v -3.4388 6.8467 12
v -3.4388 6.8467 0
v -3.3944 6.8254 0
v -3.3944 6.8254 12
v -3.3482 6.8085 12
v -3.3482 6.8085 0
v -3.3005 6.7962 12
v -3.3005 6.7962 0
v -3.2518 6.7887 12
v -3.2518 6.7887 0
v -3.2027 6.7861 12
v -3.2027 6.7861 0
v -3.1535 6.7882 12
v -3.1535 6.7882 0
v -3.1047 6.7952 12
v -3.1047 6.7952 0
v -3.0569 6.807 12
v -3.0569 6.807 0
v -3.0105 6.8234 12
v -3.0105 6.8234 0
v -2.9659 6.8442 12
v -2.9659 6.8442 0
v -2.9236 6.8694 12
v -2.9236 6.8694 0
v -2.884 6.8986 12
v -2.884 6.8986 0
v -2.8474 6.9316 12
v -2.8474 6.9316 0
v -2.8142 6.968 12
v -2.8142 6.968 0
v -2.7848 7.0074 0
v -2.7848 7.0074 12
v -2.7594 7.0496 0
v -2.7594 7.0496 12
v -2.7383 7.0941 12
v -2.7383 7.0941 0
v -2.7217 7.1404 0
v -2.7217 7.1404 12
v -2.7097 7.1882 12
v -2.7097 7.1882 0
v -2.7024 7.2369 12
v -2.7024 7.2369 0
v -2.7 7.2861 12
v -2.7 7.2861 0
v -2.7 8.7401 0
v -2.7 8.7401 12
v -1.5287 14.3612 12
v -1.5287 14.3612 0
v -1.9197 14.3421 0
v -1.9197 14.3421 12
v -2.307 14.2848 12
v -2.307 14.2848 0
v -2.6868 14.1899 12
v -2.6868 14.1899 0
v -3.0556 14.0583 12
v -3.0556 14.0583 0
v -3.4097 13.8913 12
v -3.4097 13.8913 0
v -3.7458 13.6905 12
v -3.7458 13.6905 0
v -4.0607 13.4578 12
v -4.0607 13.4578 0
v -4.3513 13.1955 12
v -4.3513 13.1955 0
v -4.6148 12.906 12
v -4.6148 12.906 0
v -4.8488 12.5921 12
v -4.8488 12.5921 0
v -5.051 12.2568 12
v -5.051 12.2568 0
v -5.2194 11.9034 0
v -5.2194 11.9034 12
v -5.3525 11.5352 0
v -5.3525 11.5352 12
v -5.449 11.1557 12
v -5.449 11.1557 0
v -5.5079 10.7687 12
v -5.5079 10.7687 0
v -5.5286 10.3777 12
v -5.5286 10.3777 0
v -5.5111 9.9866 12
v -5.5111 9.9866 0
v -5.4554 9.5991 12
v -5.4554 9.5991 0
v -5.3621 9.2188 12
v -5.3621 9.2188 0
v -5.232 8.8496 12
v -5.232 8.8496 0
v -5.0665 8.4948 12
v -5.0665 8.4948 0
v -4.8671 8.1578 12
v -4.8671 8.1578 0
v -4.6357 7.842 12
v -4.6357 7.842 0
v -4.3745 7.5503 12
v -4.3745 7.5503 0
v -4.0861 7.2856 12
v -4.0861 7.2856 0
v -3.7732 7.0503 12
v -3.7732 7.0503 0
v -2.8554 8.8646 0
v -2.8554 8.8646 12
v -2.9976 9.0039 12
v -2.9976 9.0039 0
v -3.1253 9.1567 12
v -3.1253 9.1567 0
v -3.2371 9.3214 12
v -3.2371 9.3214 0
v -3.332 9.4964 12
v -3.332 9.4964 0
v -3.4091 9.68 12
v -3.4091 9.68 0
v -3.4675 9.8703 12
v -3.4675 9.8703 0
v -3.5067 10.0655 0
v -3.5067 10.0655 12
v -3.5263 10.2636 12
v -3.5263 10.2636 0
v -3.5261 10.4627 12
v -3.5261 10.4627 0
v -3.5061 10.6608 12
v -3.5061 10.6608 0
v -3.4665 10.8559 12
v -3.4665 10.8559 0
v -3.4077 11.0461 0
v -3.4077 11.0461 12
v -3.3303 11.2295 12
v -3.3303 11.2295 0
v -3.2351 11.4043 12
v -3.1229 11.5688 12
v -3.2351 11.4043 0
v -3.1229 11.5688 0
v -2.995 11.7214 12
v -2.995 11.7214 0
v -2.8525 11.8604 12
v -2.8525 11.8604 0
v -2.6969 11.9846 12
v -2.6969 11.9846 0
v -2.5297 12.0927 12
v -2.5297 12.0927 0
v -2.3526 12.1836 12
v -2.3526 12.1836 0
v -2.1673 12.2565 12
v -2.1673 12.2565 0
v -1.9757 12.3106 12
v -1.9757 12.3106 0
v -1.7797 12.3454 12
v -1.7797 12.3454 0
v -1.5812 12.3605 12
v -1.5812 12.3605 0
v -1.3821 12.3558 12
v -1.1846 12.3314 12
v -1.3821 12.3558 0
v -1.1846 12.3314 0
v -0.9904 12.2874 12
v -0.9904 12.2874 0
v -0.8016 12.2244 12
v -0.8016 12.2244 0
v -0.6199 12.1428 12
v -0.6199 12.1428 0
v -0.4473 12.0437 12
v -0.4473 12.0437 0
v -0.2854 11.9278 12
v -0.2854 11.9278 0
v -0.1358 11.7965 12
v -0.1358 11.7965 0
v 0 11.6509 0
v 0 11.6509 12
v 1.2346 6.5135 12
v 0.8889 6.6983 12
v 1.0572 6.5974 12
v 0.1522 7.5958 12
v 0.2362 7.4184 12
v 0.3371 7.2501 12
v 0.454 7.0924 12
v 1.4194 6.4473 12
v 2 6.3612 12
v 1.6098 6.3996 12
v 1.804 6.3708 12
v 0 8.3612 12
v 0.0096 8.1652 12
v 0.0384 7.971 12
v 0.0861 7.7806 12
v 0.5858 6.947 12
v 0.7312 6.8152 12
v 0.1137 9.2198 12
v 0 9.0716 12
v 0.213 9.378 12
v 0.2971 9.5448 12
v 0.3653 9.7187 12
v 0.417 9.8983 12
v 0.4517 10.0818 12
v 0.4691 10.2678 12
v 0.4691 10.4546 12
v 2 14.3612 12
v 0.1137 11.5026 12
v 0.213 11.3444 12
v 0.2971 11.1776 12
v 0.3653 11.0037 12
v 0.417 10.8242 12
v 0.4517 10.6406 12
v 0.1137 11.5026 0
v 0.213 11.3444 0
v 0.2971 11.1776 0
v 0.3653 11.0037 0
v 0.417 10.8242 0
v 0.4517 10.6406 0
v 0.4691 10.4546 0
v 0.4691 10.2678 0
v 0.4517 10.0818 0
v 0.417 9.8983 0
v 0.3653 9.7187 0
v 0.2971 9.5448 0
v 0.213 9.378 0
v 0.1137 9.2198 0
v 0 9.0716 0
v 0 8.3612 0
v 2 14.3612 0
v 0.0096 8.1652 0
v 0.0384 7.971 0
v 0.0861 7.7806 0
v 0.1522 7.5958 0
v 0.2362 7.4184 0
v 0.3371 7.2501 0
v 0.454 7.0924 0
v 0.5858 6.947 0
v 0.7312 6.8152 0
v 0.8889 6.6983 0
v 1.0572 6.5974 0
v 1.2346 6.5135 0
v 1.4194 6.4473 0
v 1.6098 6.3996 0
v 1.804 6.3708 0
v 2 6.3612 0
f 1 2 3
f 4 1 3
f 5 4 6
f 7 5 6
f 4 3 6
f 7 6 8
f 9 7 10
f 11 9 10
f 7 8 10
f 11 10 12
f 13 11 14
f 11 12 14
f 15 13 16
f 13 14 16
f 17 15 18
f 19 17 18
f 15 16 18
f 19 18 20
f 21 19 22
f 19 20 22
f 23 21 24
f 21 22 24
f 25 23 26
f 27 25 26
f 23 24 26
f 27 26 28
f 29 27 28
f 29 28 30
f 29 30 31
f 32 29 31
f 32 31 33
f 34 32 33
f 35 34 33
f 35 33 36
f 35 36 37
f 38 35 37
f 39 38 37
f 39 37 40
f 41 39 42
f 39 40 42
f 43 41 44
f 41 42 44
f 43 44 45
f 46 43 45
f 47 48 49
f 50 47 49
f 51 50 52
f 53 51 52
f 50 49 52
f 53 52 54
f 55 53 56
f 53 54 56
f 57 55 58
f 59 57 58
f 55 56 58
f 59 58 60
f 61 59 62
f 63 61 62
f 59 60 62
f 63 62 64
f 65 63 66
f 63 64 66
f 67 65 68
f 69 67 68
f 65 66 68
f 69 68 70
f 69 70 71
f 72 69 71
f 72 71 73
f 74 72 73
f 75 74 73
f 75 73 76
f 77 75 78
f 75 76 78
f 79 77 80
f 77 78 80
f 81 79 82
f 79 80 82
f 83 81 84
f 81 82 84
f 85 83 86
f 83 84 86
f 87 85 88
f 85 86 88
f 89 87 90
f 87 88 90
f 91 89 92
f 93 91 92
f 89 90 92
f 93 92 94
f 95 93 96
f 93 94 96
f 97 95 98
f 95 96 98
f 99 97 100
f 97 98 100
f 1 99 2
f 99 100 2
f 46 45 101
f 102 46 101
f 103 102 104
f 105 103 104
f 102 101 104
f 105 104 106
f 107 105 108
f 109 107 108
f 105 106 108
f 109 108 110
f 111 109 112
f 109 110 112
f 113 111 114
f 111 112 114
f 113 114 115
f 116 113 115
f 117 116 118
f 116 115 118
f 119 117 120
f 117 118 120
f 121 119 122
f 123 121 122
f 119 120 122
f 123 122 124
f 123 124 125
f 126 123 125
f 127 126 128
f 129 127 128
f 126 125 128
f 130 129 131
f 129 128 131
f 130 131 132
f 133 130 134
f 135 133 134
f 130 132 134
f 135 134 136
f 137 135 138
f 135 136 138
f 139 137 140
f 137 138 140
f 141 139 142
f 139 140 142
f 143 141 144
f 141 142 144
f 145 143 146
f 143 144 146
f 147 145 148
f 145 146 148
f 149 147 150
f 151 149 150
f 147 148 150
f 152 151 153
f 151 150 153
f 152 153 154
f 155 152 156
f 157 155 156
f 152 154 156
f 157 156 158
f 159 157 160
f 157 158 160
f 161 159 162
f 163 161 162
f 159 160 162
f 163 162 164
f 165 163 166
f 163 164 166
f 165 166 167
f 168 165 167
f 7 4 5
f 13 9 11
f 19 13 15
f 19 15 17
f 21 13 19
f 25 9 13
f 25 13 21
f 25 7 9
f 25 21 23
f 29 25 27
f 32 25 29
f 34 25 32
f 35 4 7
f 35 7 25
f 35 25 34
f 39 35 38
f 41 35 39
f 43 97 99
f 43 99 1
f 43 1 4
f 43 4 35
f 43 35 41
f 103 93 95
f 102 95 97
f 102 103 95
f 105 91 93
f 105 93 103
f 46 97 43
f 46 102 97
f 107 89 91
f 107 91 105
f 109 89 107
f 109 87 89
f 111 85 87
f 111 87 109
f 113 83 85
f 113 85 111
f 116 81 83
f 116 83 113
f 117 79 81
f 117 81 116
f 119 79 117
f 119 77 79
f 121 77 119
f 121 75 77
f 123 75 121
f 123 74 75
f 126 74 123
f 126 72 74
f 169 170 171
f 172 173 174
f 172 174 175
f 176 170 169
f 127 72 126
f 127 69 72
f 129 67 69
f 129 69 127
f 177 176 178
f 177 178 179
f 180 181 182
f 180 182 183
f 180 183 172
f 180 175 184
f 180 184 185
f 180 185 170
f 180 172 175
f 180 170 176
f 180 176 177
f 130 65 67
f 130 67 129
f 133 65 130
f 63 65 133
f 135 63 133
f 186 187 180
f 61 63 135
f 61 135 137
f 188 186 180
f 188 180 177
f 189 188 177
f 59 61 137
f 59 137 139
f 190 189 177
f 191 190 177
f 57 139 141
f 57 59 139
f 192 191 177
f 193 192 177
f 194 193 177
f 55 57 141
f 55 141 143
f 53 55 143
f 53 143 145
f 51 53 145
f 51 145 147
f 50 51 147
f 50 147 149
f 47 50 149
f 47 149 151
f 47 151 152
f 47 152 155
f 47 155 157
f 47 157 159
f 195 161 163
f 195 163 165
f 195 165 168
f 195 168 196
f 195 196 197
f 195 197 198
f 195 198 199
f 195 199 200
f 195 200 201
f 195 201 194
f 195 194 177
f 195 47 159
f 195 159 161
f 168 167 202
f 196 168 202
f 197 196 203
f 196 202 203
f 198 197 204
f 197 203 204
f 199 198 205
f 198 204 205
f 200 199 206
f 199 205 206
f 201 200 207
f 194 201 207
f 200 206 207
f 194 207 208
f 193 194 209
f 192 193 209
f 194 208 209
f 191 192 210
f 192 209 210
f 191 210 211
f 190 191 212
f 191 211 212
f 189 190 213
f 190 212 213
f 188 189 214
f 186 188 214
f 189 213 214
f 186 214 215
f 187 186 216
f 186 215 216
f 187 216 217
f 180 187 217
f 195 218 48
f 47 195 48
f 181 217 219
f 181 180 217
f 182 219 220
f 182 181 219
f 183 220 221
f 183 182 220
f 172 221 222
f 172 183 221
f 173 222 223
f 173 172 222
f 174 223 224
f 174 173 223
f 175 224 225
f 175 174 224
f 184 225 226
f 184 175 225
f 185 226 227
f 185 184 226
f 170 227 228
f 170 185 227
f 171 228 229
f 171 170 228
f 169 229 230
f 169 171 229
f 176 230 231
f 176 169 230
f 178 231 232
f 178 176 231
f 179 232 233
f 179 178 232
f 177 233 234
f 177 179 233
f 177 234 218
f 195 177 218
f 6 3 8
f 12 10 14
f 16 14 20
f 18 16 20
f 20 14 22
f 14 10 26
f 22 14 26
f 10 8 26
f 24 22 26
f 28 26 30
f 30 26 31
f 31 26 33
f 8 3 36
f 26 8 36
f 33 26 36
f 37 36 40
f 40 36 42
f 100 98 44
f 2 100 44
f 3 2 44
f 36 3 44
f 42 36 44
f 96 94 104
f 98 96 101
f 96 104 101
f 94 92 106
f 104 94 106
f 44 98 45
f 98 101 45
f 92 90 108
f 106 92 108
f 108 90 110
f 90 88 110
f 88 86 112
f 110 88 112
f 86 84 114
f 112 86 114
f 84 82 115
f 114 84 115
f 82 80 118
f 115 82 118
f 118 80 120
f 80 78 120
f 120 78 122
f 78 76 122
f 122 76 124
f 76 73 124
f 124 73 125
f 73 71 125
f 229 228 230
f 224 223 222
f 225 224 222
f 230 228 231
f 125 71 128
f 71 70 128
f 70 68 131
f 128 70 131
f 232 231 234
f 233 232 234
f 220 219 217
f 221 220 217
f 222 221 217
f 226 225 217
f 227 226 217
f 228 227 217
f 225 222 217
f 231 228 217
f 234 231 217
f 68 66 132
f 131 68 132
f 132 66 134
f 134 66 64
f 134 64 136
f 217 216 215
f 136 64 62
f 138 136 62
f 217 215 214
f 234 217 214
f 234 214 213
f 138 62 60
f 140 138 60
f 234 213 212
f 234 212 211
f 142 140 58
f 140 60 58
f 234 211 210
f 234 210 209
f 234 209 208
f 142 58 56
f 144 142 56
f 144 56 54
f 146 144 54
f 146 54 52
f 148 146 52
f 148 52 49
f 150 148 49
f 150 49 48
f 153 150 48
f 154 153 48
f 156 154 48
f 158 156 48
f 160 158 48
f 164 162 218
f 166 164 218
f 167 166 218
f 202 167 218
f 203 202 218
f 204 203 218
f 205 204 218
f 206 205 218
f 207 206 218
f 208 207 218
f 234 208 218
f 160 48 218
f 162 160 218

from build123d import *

# Parameters (mm, degrees)
F1_DEPTH = 12
F2_R     = 1.99999


# Not quite as in the source:
# - a fillet or chamfer is up to 0.001 mm smaller than in the source, because OpenCascade refuses the exact size
# - a feature names something its author has since deleted; it is built from what else it names


with BuildPart() as f1:
    # F0 (on Top) → F1 (new body)
    with BuildSketch(Plane.XY):
        with BuildLine():
            Line((2, 14.3612188522), (0, 14.3612188522))
            Line((0, 14.3612188522), (0, 11.6508584444))
            ThreePointArc((0, 11.6508584444), (0.4713307349, 10.3612188522), (0, 9.0715792599))
            Line((0, 9.0715792599), (0, 6.3612188522))
            Line((0, 6.3612188522), (2, 6.3612188522))
            Line((2, 6.3612188522), (2, 14.3612188522))
        make_face()
        with BuildLine():
            Line((0, 11.6508584444), (0, 14.3612188522))
            Line((0, 14.3612188522), (-1.5286692651, 14.3612188522))
            ThreePointArc((-1.5286692651, 14.3612188522), (-5.4053887158, 11.346635668), (-3.4387615336, 6.8467420026))
            ThreePointArc((-3.4387615336, 6.8467420026), (-2.9444425376, 6.8562954182), (-2.7, 7.2860516088))
            Line((-2.7, 7.2860516088), (-2.7, 8.7401129613))
            ThreePointArc((-2.7, 8.7401129613), (-2.9949681852, 11.7213539472), (0, 11.6508584444))
        make_face()
    extrude(amount=F1_DEPTH)

    # F2 (radius 2 in the source; OpenCascade refuses exactly that, so slightly less here)
    f2_edges = [f1.edges().sort_by_distance(p)[0] for p in [
        (0, 6.361219, 6),
    ]]
    fillet(f2_edges, radius=F2_R)


solid = f1.part
